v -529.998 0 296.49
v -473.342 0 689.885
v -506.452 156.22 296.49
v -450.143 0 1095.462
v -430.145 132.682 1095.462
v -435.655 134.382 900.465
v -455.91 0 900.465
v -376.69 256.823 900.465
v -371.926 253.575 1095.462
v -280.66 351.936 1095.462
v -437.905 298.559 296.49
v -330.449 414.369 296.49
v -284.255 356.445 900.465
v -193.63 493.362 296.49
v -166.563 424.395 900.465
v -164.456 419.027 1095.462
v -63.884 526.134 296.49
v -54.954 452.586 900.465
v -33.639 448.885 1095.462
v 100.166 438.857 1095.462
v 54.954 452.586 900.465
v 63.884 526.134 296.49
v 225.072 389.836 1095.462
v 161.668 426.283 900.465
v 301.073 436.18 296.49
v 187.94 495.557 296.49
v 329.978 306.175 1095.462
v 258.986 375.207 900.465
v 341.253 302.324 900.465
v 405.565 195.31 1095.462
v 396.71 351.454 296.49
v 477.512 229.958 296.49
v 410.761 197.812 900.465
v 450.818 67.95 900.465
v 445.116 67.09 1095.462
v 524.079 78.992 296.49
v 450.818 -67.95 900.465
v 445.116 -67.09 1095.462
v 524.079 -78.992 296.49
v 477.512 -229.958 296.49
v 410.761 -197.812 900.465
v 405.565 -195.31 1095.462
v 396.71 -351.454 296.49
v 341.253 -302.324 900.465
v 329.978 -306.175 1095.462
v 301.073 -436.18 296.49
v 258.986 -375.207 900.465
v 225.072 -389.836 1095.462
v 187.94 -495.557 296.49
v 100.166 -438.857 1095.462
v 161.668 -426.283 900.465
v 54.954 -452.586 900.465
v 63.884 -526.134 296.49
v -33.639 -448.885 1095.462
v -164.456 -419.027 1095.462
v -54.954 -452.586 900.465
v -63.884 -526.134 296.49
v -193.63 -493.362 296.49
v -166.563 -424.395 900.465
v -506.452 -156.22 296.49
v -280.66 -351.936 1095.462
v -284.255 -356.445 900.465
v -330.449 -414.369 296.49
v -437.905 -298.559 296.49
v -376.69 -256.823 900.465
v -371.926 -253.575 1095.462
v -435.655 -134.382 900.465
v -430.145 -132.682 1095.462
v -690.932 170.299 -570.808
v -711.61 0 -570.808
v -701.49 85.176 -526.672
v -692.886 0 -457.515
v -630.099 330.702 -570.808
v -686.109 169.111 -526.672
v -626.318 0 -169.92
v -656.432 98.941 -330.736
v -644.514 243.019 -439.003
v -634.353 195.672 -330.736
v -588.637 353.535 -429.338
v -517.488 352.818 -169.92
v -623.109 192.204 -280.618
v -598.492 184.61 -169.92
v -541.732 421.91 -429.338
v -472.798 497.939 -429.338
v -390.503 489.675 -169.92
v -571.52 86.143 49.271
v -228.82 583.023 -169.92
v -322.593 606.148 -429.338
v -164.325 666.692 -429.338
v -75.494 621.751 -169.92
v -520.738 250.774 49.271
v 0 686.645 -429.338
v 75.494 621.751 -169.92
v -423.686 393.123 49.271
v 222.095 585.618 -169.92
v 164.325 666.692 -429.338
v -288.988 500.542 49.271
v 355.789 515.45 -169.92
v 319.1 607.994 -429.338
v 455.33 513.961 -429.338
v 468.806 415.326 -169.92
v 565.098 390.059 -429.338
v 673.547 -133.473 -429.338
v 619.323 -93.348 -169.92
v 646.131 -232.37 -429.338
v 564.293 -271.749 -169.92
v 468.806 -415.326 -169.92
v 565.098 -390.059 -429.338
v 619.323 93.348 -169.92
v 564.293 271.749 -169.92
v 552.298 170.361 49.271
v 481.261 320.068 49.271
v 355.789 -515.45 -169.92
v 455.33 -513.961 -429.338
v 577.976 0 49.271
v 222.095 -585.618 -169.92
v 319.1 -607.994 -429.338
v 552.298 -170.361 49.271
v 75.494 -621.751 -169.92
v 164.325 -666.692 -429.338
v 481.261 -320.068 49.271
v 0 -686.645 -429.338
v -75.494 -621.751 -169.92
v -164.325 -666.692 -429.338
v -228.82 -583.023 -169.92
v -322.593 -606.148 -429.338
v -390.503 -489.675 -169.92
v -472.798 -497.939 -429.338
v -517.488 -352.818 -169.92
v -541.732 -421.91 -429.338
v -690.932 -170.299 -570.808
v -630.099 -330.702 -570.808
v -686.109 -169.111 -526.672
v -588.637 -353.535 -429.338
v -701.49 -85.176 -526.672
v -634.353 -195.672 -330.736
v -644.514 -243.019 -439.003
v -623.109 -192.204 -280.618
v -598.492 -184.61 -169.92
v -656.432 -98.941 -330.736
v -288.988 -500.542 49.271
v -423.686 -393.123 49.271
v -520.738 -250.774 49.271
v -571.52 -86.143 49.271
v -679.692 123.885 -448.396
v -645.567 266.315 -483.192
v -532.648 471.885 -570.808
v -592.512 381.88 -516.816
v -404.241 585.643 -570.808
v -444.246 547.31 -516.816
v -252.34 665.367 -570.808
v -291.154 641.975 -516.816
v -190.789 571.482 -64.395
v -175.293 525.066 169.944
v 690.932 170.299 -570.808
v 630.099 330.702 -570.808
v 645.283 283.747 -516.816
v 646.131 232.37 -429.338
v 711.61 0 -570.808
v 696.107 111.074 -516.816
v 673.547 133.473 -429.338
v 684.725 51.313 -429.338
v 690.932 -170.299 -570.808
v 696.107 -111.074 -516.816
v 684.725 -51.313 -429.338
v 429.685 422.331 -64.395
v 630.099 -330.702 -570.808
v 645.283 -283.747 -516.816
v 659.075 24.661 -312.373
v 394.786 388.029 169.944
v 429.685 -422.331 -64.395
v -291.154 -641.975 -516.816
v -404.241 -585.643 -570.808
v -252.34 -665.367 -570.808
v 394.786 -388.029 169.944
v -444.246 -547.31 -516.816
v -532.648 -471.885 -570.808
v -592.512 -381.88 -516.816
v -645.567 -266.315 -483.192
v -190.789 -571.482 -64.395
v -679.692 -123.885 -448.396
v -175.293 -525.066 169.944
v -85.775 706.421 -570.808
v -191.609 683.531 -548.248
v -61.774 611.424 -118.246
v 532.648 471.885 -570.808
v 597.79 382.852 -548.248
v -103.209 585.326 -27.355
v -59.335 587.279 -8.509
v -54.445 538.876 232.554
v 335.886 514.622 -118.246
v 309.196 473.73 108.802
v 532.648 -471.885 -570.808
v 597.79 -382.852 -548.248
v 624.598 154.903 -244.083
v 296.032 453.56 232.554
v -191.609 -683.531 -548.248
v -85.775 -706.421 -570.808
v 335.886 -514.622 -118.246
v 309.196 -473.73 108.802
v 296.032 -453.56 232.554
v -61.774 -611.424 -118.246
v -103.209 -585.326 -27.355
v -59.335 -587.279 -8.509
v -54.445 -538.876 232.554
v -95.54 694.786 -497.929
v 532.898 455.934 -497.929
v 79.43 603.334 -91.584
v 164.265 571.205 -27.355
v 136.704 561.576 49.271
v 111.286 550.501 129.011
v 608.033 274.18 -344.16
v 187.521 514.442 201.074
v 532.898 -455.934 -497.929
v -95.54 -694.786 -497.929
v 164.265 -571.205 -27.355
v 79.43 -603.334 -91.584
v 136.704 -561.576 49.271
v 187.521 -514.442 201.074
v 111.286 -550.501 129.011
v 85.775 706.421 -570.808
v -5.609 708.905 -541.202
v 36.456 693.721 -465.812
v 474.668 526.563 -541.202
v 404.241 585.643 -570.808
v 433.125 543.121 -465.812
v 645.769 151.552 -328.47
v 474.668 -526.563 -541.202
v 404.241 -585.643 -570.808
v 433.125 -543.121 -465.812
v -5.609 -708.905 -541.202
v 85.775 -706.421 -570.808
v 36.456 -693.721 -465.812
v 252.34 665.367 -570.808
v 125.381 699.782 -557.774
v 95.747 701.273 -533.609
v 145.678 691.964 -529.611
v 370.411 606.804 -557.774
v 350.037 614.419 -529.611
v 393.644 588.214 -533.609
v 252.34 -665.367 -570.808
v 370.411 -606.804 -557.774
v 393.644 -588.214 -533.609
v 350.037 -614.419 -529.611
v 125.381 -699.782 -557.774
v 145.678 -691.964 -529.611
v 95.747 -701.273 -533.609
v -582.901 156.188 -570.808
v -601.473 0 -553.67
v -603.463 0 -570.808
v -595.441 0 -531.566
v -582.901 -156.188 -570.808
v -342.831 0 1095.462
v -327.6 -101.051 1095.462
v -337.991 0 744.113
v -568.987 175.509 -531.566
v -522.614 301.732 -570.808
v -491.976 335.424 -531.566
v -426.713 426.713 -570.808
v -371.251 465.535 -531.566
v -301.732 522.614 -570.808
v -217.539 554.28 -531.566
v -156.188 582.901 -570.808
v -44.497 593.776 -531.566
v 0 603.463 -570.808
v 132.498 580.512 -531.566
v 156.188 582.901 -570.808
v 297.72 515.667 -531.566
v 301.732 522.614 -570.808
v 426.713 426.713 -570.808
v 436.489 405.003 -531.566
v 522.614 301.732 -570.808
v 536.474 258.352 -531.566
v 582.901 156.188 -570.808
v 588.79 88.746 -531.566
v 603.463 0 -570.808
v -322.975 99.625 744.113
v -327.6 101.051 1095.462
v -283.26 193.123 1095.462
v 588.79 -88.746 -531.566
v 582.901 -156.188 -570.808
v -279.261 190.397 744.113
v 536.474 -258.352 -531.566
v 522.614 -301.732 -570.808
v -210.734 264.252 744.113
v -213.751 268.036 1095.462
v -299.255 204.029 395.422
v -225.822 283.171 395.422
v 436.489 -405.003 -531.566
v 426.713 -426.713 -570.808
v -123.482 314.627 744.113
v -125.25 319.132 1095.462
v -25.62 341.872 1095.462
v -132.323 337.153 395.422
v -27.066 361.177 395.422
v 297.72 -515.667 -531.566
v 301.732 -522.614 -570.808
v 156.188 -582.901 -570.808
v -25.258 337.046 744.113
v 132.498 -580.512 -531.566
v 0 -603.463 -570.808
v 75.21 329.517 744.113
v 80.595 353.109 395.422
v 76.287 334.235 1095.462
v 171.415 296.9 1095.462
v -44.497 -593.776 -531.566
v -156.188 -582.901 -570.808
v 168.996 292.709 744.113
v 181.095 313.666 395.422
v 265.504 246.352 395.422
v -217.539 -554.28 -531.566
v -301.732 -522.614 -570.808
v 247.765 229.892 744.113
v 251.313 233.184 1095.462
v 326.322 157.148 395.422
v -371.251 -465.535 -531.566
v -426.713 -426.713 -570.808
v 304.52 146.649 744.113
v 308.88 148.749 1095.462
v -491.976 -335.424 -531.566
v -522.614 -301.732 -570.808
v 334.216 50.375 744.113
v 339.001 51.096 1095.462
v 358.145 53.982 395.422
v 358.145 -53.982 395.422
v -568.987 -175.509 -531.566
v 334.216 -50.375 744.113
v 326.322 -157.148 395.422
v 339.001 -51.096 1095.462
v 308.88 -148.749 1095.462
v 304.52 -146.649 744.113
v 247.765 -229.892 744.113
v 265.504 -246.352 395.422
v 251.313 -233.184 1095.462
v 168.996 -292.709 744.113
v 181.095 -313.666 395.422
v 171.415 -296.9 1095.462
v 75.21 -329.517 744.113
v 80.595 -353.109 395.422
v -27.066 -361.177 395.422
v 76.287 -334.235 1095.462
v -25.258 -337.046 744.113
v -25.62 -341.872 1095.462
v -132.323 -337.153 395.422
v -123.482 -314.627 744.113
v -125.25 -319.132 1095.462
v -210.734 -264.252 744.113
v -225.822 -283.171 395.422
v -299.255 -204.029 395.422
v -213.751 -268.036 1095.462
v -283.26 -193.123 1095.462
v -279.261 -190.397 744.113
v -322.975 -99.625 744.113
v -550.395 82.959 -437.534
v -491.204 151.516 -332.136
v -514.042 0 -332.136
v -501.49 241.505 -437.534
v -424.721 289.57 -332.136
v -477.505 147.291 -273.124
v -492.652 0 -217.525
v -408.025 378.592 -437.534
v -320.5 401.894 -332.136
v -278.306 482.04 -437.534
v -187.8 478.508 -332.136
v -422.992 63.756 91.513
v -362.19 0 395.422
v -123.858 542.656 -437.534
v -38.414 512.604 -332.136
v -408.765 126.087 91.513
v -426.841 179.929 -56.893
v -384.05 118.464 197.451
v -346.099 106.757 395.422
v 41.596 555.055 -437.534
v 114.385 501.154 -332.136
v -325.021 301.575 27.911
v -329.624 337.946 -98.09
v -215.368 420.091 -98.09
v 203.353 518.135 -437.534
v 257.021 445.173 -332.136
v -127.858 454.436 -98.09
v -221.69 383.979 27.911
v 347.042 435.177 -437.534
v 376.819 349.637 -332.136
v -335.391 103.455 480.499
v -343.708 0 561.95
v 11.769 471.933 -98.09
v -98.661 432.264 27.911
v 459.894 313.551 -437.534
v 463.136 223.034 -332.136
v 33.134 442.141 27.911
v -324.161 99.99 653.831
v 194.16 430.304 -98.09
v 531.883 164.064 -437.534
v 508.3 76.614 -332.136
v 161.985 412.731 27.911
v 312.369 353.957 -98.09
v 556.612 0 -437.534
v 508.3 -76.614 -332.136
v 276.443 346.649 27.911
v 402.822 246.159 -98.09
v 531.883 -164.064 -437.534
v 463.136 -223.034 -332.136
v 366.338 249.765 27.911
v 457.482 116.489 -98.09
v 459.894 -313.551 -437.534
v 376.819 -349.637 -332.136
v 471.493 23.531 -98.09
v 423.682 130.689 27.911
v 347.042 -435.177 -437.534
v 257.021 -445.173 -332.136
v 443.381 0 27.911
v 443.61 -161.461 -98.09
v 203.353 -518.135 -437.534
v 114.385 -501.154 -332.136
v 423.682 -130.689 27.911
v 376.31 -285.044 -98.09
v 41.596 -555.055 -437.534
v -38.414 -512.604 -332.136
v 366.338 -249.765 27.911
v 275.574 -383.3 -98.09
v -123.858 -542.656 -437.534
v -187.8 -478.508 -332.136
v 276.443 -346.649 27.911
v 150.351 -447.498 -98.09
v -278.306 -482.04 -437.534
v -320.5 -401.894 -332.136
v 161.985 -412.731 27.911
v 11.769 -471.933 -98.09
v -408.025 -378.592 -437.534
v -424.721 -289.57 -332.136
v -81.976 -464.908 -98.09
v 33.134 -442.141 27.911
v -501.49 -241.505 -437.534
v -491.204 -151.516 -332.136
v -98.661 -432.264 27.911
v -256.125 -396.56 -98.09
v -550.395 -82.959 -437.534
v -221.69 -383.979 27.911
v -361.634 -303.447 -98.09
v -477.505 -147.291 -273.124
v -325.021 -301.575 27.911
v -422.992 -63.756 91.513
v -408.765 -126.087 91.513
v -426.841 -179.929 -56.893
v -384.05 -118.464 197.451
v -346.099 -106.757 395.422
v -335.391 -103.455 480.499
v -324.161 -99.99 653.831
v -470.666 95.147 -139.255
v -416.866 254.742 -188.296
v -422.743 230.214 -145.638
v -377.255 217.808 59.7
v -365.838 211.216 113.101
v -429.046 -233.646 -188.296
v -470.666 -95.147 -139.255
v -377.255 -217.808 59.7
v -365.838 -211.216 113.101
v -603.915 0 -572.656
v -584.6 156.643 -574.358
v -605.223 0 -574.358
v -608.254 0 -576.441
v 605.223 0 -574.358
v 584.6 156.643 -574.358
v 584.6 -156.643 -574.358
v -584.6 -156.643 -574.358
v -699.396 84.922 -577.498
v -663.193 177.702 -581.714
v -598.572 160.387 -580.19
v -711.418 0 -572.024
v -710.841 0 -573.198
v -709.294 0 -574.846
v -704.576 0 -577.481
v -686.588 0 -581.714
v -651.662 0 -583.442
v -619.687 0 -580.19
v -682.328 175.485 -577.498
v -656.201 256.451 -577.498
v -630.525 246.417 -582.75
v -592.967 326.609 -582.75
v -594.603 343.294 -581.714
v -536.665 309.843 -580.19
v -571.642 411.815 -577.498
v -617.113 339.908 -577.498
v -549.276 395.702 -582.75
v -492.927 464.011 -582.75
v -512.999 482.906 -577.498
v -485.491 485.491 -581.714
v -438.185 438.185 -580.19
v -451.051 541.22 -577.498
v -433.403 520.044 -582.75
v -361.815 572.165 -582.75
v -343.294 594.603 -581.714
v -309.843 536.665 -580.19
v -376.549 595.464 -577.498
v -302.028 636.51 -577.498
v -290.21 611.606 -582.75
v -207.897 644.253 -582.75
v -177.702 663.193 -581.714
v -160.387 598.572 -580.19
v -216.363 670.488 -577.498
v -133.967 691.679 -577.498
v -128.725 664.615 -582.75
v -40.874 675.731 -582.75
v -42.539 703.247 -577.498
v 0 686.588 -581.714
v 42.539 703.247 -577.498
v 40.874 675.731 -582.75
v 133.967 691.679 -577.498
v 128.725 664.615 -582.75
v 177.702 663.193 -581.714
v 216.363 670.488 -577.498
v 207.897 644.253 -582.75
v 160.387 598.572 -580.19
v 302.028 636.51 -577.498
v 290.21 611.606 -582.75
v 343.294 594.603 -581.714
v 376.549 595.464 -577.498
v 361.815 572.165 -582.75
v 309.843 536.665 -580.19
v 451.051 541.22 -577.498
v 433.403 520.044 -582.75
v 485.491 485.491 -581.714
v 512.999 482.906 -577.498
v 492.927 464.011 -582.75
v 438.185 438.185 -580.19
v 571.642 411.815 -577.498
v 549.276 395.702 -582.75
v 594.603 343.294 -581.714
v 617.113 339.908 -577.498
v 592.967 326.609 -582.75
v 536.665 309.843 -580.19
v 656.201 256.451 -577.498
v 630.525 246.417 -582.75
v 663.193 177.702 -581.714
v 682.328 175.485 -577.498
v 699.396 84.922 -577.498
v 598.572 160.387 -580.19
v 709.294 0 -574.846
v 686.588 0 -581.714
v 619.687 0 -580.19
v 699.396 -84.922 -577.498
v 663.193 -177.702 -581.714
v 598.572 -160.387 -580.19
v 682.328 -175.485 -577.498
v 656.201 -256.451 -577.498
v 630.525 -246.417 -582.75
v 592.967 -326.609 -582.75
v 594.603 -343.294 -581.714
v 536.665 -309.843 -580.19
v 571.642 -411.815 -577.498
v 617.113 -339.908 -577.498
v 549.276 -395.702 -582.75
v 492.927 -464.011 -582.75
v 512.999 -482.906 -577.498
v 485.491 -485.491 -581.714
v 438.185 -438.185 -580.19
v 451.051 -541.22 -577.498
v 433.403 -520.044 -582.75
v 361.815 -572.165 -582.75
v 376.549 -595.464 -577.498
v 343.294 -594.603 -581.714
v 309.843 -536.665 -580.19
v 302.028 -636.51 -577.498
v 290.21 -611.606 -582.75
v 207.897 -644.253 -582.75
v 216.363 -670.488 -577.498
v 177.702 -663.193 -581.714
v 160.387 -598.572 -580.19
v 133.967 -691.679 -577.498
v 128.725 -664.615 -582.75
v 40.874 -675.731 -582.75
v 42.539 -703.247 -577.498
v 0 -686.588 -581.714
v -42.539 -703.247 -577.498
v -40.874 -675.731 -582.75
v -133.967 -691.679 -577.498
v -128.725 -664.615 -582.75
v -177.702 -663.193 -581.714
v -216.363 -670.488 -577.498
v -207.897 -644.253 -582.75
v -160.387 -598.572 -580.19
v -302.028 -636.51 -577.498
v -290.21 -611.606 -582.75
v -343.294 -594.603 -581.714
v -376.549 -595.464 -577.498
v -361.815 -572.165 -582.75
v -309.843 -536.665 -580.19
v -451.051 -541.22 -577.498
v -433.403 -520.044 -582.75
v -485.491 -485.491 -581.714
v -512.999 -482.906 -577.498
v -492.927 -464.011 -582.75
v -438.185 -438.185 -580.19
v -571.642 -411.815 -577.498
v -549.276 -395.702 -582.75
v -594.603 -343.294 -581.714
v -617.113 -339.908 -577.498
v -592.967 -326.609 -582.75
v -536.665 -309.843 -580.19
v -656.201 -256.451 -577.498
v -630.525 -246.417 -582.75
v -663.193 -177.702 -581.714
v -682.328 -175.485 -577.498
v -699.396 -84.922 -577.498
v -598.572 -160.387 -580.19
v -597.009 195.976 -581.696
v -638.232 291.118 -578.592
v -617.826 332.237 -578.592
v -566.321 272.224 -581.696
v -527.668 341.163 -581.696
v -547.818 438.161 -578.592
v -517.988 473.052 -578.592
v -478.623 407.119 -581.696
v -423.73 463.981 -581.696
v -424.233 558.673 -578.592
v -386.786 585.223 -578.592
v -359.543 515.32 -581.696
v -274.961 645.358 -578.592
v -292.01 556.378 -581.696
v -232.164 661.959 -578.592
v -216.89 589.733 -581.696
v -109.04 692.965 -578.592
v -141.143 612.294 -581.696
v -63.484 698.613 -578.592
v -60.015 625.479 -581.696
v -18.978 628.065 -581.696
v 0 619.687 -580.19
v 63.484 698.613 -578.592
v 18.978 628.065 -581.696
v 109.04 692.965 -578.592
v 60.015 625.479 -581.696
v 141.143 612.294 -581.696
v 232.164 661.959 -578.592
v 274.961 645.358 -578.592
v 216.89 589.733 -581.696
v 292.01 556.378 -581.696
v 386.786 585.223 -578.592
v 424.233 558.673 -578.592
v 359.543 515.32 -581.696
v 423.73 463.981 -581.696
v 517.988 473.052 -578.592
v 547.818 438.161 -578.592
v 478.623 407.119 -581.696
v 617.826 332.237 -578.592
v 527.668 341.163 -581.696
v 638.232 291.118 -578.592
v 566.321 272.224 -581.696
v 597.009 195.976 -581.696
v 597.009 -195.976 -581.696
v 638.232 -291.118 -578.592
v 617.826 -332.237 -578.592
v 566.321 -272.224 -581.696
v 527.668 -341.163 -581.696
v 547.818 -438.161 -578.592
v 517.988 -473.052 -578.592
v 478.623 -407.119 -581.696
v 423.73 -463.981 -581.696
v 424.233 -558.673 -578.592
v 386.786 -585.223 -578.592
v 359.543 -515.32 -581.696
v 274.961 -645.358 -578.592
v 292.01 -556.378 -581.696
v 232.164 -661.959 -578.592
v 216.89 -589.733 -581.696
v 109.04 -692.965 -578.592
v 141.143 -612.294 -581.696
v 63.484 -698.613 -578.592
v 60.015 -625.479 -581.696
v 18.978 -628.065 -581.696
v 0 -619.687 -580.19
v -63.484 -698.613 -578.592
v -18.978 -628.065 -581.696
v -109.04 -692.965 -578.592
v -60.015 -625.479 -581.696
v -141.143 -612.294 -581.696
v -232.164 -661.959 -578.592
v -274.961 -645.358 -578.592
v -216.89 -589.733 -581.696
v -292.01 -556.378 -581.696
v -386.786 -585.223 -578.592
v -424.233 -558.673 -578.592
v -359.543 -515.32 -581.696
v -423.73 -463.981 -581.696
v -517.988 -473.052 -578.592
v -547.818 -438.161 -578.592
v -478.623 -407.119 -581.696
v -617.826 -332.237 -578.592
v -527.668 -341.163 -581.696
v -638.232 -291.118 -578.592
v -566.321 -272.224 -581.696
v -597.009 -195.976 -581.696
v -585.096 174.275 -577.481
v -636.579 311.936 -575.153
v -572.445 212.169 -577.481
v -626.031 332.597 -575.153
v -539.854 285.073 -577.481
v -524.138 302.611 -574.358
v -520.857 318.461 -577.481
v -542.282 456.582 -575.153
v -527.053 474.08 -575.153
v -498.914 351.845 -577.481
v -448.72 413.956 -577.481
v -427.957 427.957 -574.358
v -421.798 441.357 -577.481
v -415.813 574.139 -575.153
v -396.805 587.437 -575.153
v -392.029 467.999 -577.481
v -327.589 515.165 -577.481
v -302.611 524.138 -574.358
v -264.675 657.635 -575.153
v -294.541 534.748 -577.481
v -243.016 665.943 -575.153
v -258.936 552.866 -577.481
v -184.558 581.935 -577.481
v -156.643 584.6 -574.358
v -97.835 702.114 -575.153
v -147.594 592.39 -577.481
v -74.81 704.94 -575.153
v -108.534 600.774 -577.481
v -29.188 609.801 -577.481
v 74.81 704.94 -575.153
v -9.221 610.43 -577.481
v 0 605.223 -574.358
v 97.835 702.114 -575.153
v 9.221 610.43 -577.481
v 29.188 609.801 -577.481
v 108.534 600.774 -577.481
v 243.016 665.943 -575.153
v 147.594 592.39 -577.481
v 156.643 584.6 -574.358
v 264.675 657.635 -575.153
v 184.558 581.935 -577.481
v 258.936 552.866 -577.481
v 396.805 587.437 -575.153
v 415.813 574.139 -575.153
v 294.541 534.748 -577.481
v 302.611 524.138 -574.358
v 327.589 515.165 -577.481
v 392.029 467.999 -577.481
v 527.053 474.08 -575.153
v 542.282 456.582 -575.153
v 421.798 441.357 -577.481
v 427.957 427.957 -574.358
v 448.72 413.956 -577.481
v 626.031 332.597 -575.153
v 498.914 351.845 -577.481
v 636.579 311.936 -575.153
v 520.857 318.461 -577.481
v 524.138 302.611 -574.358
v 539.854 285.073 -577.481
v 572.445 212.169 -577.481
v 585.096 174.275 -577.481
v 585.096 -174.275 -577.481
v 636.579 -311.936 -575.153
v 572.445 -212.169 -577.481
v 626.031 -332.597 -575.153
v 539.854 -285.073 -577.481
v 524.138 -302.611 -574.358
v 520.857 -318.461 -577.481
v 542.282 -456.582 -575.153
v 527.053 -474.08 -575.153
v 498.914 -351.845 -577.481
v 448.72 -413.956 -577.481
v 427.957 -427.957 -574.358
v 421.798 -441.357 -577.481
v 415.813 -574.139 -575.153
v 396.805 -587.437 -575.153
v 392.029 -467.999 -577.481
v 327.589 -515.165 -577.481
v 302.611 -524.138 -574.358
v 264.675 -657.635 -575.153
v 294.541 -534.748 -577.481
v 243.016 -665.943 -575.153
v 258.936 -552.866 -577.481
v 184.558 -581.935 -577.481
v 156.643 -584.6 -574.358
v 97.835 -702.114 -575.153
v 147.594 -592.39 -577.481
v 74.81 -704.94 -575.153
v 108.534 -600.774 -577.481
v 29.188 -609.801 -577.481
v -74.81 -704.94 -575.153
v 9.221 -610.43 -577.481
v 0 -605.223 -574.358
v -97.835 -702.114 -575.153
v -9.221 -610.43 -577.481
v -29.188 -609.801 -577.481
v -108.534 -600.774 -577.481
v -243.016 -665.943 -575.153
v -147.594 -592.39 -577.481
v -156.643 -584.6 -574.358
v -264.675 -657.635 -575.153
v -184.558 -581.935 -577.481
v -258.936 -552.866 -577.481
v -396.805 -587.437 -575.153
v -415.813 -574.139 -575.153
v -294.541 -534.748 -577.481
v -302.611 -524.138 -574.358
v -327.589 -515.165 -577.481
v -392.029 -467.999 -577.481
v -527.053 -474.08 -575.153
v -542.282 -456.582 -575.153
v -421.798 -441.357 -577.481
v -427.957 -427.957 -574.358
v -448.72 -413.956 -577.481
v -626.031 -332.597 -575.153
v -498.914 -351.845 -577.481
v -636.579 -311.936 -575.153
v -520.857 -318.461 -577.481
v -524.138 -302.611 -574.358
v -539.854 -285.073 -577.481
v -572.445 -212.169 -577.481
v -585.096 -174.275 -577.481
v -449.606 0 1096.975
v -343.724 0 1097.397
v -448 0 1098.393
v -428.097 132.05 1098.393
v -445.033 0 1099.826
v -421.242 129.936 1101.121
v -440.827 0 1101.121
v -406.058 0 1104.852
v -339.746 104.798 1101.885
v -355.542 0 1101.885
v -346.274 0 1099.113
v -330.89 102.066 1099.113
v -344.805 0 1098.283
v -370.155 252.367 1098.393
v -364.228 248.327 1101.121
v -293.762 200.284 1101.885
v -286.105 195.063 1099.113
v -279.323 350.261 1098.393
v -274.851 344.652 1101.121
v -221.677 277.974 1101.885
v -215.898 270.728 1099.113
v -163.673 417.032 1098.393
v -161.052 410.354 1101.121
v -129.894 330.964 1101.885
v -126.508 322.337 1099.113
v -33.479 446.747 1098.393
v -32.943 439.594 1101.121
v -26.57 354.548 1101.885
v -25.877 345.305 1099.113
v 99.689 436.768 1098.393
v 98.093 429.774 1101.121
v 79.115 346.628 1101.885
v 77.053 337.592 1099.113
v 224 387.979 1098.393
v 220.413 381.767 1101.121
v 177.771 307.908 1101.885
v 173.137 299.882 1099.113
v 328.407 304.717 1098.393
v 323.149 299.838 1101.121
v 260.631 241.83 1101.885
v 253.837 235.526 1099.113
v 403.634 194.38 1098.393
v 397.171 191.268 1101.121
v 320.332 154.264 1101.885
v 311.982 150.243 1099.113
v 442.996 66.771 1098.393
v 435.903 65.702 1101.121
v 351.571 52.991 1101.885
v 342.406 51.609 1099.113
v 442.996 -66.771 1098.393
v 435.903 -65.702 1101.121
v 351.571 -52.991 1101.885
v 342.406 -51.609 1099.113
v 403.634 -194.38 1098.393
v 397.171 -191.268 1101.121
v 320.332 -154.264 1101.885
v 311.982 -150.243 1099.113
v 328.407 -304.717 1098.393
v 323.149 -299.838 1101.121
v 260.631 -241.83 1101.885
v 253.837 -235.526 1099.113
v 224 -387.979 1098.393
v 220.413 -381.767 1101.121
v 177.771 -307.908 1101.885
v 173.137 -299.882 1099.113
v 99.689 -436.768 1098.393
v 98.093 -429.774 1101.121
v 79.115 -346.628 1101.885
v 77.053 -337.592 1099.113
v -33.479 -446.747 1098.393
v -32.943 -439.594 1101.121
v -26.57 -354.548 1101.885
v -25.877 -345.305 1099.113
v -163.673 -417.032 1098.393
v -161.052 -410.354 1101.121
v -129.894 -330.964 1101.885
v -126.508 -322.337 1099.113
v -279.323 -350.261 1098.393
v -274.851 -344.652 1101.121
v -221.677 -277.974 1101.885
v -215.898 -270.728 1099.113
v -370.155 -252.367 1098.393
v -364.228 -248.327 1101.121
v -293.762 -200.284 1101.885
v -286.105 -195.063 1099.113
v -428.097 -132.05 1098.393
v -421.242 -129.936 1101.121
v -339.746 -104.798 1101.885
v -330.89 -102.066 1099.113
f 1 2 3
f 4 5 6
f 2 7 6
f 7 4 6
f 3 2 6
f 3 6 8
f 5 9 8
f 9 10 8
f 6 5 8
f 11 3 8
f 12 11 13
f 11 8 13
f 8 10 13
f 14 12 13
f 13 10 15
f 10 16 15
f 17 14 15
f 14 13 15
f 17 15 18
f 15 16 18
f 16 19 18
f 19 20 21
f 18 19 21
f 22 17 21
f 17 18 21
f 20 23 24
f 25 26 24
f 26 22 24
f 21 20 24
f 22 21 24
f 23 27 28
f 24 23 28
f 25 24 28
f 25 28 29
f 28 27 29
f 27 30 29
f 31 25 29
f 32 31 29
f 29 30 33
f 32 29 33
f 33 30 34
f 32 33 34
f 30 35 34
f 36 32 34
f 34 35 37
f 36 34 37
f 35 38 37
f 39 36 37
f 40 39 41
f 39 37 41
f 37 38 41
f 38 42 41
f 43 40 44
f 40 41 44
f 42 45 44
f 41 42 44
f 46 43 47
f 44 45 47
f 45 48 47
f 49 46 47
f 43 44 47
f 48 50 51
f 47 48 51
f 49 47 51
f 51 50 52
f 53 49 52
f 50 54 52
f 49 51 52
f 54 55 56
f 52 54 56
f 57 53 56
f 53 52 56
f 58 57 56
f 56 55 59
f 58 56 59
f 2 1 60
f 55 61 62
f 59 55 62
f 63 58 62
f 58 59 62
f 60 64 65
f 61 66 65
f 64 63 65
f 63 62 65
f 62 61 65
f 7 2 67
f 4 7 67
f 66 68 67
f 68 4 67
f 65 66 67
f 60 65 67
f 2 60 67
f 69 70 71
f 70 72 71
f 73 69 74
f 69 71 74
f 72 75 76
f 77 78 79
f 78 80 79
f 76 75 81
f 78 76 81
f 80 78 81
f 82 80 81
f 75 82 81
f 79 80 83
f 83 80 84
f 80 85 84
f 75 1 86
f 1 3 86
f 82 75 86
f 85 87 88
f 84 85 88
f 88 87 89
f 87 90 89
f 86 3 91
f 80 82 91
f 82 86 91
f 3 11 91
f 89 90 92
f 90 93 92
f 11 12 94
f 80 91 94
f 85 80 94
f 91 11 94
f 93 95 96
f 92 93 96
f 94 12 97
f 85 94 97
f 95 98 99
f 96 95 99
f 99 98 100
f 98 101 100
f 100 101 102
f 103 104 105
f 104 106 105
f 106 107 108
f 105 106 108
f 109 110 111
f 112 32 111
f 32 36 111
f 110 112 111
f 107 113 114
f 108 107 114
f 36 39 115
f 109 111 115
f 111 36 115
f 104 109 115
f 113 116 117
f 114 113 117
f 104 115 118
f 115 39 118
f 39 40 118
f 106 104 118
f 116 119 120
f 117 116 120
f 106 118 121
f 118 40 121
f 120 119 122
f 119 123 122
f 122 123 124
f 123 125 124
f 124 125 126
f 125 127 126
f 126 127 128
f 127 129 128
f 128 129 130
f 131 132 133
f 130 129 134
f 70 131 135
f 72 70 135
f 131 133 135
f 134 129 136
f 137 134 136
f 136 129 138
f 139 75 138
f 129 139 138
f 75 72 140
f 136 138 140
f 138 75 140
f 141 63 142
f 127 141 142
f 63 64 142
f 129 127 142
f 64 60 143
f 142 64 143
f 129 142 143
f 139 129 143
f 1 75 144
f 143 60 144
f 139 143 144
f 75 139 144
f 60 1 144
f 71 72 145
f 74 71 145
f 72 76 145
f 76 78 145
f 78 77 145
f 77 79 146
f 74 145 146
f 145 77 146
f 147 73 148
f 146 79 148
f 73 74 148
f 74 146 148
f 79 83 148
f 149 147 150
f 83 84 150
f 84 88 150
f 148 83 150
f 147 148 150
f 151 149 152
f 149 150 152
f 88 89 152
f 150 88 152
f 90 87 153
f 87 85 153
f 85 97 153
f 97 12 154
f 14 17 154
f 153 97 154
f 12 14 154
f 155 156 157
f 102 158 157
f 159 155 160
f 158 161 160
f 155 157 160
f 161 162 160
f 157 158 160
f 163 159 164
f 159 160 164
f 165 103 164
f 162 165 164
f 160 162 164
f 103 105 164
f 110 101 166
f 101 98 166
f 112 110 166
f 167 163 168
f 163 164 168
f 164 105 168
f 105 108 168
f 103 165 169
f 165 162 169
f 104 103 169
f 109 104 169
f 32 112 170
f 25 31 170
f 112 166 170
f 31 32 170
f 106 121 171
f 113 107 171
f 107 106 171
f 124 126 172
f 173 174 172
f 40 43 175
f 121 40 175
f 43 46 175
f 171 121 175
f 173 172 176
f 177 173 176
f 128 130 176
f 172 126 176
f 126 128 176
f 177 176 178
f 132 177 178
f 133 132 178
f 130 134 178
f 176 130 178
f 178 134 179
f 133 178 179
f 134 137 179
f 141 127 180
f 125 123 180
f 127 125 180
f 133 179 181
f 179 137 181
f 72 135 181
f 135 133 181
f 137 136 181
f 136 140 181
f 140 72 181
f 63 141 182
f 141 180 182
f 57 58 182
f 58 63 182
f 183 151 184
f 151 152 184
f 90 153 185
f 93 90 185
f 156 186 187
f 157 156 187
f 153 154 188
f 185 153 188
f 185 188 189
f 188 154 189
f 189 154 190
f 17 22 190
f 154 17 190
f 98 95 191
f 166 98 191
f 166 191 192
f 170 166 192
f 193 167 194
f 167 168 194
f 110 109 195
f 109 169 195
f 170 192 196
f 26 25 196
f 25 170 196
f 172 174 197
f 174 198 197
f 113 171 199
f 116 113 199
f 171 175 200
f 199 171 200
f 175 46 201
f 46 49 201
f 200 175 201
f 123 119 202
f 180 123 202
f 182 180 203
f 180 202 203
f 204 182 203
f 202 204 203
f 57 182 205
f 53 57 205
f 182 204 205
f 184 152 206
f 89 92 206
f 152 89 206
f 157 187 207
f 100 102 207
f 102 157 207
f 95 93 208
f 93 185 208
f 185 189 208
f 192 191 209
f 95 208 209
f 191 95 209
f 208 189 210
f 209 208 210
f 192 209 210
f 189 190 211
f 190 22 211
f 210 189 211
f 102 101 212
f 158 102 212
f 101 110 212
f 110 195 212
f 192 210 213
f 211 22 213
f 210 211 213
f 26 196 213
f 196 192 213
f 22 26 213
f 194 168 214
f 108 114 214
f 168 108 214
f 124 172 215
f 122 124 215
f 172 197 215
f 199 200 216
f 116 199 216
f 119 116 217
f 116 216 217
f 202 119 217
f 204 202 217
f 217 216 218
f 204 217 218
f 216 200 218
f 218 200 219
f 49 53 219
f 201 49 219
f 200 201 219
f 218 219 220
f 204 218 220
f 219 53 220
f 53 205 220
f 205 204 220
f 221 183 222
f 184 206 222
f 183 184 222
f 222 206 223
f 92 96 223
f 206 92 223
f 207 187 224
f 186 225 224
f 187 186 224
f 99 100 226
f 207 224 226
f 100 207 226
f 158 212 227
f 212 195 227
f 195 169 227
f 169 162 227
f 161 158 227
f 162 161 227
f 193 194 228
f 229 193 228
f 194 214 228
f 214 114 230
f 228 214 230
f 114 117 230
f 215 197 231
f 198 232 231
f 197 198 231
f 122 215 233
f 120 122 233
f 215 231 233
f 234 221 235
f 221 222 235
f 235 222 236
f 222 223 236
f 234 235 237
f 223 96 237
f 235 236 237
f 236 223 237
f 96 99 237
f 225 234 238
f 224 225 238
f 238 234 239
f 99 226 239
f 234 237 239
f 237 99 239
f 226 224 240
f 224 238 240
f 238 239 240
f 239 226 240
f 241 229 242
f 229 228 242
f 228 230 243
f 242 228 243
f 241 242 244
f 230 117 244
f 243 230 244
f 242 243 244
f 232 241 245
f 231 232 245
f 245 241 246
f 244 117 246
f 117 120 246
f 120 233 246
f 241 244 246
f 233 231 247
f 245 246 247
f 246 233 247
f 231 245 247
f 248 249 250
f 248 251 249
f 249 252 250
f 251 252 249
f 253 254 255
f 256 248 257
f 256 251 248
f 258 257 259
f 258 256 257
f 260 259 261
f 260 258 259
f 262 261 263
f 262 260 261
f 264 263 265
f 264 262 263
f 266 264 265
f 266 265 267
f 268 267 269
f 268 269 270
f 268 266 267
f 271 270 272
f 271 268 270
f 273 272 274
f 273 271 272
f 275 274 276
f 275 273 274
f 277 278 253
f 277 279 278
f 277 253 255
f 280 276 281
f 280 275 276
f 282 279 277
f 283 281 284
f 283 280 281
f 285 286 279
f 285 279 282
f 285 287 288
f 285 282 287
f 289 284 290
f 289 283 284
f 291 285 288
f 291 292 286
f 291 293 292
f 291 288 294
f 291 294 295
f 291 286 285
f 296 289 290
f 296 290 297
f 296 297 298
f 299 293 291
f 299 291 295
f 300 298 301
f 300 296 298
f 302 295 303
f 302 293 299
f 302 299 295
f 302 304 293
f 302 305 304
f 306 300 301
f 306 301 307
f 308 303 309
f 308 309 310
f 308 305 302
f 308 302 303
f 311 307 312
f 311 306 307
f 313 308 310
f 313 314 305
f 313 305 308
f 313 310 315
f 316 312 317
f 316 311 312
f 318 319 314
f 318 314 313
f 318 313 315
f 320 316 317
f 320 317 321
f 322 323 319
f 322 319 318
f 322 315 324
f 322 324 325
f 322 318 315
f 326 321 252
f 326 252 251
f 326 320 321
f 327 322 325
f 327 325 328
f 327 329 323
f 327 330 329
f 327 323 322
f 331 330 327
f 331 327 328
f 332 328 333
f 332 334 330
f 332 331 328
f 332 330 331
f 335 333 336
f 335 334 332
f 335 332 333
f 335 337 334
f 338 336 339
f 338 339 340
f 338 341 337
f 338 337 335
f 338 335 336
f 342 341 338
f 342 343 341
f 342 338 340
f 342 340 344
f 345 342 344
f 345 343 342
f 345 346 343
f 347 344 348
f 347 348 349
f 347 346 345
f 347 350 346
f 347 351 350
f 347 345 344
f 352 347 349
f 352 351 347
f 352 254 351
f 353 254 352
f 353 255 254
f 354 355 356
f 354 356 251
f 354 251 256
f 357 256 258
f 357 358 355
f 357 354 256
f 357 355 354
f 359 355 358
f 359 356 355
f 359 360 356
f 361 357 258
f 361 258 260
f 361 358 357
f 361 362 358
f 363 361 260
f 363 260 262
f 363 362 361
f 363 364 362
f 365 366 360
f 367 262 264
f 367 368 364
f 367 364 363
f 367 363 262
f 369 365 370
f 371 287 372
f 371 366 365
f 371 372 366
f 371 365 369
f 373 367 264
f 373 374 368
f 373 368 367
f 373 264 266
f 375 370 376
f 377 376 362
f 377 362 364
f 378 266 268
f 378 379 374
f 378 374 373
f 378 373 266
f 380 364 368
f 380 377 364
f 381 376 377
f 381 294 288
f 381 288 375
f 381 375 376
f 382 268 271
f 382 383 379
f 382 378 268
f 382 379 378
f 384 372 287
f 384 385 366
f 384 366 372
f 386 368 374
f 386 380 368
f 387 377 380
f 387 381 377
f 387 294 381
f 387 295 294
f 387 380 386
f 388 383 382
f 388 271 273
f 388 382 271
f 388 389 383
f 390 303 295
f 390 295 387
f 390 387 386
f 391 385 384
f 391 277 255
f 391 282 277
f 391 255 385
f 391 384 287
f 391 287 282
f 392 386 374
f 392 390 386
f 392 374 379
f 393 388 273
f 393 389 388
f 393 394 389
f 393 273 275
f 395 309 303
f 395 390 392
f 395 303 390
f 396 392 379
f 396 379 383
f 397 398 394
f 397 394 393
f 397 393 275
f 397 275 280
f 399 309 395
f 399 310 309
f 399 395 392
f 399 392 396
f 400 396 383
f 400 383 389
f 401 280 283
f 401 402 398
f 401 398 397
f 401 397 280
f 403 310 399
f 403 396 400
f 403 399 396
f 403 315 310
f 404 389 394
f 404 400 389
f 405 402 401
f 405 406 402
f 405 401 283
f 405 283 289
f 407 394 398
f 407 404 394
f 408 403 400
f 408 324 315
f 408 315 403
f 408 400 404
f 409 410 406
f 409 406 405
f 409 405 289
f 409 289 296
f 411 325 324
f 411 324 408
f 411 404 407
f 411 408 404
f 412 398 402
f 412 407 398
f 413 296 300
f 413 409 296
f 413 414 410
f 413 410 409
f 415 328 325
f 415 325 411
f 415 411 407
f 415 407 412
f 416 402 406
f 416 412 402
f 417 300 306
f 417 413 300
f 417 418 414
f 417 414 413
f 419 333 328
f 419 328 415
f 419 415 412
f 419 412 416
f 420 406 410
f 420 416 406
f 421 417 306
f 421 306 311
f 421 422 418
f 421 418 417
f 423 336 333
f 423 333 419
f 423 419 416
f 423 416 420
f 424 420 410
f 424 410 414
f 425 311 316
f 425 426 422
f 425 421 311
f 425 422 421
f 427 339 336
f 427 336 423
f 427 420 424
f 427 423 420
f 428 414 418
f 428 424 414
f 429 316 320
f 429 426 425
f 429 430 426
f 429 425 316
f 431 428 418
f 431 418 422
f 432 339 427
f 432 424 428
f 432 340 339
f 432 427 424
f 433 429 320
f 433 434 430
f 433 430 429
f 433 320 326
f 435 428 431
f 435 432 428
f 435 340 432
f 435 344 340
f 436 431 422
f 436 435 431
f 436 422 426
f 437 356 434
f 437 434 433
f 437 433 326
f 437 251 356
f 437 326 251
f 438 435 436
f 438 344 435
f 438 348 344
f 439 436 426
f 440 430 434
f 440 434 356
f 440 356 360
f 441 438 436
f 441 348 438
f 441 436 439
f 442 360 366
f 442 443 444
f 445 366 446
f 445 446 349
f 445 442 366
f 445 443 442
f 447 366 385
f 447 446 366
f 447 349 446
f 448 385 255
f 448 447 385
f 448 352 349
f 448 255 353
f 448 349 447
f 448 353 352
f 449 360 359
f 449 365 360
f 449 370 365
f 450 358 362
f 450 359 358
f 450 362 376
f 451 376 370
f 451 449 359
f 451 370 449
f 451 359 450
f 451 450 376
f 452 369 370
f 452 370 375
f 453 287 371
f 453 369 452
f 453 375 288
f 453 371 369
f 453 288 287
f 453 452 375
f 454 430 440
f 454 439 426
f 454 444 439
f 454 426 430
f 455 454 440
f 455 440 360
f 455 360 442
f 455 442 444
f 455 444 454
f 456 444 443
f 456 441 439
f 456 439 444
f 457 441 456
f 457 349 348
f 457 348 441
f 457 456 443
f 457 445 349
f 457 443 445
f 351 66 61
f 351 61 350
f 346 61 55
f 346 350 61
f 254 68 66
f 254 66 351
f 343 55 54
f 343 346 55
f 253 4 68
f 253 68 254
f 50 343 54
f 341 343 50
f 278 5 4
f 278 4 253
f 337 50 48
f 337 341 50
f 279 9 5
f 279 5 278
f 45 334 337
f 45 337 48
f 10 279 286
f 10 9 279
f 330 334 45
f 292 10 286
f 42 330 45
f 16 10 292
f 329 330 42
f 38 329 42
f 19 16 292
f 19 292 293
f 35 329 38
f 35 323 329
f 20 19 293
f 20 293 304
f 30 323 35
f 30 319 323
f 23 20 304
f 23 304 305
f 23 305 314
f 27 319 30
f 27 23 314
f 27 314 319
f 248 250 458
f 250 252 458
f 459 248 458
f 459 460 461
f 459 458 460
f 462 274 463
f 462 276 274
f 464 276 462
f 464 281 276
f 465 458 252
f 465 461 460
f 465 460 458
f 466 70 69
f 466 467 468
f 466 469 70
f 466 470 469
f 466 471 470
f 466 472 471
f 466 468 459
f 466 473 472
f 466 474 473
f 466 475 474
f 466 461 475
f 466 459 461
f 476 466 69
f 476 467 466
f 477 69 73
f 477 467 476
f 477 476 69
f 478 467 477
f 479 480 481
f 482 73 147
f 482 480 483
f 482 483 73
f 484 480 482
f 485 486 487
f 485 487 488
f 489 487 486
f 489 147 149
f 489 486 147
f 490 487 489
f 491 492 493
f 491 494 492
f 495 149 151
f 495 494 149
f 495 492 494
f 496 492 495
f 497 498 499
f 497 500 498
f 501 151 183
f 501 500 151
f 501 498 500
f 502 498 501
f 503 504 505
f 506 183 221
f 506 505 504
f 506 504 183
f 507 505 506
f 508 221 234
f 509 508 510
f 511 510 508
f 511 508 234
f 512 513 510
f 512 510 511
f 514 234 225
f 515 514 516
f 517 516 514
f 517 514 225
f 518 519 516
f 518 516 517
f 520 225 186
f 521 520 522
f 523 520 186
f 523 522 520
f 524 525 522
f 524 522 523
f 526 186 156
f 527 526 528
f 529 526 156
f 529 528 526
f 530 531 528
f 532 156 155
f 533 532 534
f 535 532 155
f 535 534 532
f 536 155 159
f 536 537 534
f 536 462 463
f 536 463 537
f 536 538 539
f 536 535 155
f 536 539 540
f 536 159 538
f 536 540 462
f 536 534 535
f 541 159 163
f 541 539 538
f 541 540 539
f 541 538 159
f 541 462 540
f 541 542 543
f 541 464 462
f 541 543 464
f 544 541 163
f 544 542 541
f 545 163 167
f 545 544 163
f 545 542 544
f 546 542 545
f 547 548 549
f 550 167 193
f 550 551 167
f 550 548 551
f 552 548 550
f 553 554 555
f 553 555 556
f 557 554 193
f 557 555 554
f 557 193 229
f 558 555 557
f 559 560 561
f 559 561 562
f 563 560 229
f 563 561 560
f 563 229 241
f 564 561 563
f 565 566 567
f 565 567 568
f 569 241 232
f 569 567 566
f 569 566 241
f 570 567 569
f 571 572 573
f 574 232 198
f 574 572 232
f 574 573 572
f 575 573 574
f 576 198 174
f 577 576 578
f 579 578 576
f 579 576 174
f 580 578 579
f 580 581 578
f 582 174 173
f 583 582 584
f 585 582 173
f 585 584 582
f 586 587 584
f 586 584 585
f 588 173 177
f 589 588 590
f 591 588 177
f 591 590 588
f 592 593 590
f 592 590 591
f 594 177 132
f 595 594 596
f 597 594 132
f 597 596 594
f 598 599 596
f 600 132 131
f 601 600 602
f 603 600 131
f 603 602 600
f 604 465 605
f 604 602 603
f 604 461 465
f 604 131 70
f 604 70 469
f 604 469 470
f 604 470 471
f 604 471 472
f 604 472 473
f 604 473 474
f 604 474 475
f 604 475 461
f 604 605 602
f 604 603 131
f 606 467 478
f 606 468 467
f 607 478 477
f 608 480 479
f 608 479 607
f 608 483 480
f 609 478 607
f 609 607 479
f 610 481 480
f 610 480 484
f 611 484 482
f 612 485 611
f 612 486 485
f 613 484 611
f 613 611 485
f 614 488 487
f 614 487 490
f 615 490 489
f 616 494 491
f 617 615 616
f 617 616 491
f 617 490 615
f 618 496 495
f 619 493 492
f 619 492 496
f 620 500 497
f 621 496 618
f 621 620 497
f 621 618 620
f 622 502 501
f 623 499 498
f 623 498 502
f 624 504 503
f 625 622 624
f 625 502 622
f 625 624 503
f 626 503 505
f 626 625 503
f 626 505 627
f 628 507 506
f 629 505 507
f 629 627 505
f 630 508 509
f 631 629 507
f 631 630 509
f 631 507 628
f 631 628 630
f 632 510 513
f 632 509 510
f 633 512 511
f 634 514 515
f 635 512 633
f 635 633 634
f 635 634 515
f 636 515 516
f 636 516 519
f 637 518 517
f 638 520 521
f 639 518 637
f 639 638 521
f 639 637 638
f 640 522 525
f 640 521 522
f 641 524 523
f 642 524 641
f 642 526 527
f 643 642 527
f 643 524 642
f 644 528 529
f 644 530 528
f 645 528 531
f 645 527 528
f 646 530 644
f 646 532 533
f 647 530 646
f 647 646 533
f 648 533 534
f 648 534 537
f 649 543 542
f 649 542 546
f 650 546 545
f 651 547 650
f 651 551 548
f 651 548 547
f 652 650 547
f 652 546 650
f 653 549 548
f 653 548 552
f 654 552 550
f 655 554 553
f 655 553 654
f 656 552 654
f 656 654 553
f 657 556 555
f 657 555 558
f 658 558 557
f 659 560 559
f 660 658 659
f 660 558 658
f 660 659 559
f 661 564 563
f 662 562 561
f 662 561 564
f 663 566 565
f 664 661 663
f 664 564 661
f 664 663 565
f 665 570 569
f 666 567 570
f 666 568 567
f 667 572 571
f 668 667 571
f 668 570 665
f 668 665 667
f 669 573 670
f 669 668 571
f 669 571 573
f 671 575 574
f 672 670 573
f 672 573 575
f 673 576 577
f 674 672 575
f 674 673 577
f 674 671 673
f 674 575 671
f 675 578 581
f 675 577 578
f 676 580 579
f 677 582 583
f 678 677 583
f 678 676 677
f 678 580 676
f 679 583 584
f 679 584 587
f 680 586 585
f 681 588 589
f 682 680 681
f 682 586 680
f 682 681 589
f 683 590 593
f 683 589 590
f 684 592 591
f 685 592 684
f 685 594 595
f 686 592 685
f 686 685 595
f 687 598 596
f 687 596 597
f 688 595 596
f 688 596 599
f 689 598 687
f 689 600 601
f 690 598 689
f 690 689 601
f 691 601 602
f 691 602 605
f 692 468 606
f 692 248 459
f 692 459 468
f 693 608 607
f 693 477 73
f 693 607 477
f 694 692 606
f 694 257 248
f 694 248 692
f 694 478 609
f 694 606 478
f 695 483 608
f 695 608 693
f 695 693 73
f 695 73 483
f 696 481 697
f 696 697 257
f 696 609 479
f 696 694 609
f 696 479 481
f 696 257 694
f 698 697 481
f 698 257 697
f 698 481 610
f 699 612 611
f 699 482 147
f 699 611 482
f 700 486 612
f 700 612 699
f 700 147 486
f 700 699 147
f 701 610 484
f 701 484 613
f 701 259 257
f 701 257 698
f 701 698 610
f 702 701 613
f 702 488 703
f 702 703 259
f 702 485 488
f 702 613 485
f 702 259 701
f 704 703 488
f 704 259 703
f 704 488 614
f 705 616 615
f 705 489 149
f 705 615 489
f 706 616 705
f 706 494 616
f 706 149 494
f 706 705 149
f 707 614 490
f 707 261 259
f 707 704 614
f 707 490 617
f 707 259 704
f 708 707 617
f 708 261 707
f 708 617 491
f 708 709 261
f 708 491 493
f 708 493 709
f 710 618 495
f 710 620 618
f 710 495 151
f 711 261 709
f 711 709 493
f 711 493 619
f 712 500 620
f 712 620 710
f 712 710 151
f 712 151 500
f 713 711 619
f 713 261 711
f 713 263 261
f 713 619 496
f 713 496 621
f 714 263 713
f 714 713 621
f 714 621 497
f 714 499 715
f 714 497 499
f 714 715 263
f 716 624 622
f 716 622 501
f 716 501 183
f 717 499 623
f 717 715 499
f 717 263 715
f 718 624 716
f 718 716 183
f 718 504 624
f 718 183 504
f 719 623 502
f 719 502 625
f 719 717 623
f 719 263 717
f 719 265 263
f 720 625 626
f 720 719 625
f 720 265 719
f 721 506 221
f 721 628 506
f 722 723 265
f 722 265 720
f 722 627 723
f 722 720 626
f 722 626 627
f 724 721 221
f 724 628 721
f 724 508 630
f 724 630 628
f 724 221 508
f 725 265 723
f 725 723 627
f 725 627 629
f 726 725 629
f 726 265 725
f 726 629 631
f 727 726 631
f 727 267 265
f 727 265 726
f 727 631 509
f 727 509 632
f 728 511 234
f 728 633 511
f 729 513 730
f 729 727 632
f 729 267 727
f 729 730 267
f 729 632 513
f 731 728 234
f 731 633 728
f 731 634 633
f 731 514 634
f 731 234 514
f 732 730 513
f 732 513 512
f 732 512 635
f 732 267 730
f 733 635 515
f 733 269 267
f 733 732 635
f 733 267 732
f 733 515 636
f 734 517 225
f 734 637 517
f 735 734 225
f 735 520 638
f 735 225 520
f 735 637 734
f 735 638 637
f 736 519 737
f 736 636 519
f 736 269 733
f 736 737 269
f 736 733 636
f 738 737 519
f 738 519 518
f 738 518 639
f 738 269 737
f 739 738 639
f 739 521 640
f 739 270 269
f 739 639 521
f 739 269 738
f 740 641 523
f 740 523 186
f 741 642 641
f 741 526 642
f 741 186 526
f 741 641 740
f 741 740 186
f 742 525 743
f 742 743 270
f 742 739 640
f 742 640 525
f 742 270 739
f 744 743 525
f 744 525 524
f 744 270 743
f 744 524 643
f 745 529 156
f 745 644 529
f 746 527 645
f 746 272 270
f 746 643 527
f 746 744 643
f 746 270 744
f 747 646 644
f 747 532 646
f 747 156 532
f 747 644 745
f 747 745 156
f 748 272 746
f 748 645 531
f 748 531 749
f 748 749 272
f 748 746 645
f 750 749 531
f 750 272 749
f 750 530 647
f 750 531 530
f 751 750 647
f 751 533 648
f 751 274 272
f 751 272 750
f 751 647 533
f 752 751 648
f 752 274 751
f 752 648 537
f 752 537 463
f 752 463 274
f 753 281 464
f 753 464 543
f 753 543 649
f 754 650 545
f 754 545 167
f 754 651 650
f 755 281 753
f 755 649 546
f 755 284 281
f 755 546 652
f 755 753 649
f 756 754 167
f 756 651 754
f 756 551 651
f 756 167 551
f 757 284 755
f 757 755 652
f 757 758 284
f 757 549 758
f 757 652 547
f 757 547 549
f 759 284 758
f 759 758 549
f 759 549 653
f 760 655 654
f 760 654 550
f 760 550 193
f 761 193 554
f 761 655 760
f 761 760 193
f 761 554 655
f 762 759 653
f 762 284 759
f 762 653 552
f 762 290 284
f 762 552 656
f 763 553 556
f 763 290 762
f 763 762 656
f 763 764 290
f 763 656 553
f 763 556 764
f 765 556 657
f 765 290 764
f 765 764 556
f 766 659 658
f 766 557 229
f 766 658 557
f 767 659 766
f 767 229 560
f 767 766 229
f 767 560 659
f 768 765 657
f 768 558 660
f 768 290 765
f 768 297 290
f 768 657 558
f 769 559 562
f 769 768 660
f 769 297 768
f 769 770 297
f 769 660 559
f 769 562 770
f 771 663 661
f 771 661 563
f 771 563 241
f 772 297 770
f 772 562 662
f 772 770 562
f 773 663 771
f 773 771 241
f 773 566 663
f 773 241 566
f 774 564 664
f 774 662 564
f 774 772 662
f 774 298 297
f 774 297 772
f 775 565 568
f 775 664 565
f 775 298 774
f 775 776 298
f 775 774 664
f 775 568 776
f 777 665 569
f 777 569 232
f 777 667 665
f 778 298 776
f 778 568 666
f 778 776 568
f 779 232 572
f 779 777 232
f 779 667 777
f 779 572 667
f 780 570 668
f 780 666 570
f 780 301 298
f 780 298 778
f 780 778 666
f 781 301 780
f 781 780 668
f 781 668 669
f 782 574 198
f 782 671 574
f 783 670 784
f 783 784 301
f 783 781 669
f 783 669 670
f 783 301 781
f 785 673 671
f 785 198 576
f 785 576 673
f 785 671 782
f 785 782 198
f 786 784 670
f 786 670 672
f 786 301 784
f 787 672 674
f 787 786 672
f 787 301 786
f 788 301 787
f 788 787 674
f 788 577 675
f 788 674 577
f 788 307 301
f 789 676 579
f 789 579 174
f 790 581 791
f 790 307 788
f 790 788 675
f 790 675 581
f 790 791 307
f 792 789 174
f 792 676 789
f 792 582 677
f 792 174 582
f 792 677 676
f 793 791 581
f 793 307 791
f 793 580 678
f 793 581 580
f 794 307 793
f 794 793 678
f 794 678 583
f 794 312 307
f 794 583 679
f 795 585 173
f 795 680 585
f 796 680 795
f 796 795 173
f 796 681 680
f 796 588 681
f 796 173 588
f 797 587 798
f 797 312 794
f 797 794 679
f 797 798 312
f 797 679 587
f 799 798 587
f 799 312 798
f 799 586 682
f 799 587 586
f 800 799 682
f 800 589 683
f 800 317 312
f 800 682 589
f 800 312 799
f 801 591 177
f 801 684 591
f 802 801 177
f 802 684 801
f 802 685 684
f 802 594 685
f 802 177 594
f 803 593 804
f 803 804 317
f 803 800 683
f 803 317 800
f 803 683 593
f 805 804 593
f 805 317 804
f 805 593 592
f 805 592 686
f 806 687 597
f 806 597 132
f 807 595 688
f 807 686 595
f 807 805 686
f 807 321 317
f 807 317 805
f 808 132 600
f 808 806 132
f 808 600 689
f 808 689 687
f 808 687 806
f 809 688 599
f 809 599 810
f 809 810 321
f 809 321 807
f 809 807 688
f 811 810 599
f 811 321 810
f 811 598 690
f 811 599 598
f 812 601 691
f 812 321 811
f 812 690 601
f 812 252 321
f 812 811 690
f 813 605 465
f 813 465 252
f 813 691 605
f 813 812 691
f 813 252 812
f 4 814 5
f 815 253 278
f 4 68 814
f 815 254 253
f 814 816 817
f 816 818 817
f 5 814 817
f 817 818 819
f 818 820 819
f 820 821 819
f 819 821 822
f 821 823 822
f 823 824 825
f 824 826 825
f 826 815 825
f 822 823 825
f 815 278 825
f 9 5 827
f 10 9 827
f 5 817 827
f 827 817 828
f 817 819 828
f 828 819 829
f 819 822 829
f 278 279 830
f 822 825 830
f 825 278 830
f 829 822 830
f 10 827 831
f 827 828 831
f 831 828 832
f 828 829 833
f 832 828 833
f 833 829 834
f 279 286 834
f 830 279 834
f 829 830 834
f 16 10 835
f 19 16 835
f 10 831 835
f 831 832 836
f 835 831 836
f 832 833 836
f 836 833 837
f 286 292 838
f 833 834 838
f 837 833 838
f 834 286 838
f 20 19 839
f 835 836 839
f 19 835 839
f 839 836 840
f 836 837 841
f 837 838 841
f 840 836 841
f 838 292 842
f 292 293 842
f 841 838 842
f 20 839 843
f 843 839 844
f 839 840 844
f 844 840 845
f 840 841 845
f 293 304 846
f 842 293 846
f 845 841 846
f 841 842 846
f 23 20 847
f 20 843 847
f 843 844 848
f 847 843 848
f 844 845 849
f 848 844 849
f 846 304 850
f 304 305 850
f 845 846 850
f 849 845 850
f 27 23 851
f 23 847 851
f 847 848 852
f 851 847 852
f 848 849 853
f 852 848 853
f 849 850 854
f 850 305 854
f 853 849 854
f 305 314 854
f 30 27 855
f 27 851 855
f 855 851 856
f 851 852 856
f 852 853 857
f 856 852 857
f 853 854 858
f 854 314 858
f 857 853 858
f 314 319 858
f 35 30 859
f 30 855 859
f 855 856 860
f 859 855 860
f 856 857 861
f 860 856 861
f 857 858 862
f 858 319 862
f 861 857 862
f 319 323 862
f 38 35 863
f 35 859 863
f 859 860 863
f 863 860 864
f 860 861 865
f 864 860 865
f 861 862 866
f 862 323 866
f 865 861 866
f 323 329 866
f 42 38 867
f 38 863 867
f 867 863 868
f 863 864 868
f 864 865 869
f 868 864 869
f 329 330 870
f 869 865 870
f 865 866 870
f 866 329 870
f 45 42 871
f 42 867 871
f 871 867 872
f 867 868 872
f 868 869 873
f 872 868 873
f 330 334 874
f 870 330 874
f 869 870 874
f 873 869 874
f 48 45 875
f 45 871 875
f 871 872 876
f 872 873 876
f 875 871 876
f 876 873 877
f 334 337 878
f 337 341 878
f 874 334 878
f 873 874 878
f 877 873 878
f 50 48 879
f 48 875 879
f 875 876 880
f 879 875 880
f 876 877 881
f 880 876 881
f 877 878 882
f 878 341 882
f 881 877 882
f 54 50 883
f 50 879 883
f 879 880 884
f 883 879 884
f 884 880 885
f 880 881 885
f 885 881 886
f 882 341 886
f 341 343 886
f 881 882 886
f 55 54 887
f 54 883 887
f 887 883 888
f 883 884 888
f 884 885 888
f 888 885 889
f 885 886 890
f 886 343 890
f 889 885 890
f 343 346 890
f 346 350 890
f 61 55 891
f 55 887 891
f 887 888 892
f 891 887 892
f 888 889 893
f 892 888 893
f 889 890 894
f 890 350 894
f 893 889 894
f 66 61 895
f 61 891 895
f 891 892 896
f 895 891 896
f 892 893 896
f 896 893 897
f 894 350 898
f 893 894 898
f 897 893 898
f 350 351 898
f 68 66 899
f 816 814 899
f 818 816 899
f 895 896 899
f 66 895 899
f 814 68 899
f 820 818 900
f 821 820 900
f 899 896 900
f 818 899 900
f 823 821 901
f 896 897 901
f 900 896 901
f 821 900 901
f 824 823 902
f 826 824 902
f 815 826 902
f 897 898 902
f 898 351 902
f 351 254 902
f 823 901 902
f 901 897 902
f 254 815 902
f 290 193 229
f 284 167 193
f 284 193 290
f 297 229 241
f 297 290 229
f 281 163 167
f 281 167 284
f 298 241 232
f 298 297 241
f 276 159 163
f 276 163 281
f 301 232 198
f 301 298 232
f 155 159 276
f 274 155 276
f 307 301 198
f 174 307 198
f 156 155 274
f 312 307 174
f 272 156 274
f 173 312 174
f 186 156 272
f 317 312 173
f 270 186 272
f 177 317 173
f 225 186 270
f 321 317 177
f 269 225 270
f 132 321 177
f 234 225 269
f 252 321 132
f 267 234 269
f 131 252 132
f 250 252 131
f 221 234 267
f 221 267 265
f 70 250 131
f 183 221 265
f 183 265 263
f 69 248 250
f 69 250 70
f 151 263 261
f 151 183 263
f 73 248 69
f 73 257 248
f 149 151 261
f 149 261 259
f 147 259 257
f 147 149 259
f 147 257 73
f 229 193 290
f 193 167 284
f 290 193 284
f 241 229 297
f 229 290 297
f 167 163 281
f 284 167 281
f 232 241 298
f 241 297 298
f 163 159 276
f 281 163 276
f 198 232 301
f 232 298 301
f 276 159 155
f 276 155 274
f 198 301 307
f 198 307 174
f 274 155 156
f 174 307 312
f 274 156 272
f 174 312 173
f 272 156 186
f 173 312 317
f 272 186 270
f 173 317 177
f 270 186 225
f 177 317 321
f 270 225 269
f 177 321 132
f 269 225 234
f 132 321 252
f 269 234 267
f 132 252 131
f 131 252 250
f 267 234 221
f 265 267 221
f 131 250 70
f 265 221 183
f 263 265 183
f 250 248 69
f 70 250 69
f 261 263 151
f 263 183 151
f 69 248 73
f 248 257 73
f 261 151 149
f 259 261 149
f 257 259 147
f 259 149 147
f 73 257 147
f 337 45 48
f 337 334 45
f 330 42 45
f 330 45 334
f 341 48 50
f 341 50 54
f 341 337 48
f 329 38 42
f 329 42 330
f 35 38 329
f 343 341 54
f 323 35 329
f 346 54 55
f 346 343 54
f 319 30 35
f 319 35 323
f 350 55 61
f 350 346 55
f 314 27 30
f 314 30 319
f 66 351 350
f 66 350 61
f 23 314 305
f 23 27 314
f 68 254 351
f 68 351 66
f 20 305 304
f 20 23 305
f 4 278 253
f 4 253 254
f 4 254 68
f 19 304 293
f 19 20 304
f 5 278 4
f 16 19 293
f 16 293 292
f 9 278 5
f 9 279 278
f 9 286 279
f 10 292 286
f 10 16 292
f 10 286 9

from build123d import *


with BuildPart() as part:
    # Sketch21 → Revolve2 (revolve)
    with BuildSketch(Plane(origin=(0, 0, 0), x_dir=(1, 0, 0), z_dir=(0, 1, 0))):
        with BuildLine():
            Line((-342.830536996, -1095.462493929), (-450.143329298, -1095.462493929))
            add(Edge.make_bspline(
                [(-711.609923736, 570.808492492), (-711.609923736, 445.424540116), (-450.143329298, -365.153373544), (-450.143329298, -1095.462493929)],
                knots=[0, 0, 0, 0, 1, 1, 1, 1], degree=3))
            Line((-711.609923736, 570.808492492), (-603.463057221, 570.808492492))
            add(Edge.make_bspline(
                [(-603.463057221, 570.808492492), (-603.463057221, 518.17273997), (-505.664095697, 359.371165984), (-484.160636642, 99.187151717), (-304.658098036, -485.273482821), (-342.830536996, -806.353873289), (-342.830536996, -1095.462493929)],
                knots=[0, 0, 0, 0, 0.158009172, 0.206506907, 0.484977351, 1, 1, 1, 1], degree=3))
        make_face()
    revolve(axis=Axis((0, 0, 99.684784321), (0, 0, -1)))


with BuildPart() as body_2:
    # Sketch22 → Revolve3 (revolve)
    with BuildSketch(Plane(origin=(0, 0, 0), x_dir=(1, 0, 0), z_dir=(0, 1, 0))):
        with BuildLine():
            Line((-711.609923736, 570.808492492), (-603.463057221, 570.808492492))
            add(Edge.make_bspline(
                [(-711.609923736, 570.808492492), (-711.609923736, 587.741825826), (-603.463057221, 587.741825826), (-603.463057221, 570.808492492)],
                knots=[0, 0, 0, 0, 1, 1, 1, 1], degree=3))
        make_face()
    revolve(axis=Axis((0, 0, 99.684784321), (0, 0, -1)))


with BuildPart() as body_3:
    # Sketch23 → Revolve4 (revolve)
    with BuildSketch(Plane(origin=(0, 0, 0), x_dir=(1, 0, 0), z_dir=(0, 1, 0))):
        with BuildLine():
            Line((-450.143329298, -1095.462493929), (-342.830536996, -1095.462493929))
            add(Edge.make_bspline(
                [(-450.143329298, -1095.462493929), (-450.143329298, -1108.162493929), (-342.830536996, -1108.162493929), (-342.830536996, -1095.462493929)],
                knots=[0, 0, 0, 0, 1, 1, 1, 1], degree=3))
        make_face()
    revolve(axis=Axis((0, 0, 1104.756830123), (0, 0, -1)))


solid = Compound([part.part, body_2.part, body_3.part])
